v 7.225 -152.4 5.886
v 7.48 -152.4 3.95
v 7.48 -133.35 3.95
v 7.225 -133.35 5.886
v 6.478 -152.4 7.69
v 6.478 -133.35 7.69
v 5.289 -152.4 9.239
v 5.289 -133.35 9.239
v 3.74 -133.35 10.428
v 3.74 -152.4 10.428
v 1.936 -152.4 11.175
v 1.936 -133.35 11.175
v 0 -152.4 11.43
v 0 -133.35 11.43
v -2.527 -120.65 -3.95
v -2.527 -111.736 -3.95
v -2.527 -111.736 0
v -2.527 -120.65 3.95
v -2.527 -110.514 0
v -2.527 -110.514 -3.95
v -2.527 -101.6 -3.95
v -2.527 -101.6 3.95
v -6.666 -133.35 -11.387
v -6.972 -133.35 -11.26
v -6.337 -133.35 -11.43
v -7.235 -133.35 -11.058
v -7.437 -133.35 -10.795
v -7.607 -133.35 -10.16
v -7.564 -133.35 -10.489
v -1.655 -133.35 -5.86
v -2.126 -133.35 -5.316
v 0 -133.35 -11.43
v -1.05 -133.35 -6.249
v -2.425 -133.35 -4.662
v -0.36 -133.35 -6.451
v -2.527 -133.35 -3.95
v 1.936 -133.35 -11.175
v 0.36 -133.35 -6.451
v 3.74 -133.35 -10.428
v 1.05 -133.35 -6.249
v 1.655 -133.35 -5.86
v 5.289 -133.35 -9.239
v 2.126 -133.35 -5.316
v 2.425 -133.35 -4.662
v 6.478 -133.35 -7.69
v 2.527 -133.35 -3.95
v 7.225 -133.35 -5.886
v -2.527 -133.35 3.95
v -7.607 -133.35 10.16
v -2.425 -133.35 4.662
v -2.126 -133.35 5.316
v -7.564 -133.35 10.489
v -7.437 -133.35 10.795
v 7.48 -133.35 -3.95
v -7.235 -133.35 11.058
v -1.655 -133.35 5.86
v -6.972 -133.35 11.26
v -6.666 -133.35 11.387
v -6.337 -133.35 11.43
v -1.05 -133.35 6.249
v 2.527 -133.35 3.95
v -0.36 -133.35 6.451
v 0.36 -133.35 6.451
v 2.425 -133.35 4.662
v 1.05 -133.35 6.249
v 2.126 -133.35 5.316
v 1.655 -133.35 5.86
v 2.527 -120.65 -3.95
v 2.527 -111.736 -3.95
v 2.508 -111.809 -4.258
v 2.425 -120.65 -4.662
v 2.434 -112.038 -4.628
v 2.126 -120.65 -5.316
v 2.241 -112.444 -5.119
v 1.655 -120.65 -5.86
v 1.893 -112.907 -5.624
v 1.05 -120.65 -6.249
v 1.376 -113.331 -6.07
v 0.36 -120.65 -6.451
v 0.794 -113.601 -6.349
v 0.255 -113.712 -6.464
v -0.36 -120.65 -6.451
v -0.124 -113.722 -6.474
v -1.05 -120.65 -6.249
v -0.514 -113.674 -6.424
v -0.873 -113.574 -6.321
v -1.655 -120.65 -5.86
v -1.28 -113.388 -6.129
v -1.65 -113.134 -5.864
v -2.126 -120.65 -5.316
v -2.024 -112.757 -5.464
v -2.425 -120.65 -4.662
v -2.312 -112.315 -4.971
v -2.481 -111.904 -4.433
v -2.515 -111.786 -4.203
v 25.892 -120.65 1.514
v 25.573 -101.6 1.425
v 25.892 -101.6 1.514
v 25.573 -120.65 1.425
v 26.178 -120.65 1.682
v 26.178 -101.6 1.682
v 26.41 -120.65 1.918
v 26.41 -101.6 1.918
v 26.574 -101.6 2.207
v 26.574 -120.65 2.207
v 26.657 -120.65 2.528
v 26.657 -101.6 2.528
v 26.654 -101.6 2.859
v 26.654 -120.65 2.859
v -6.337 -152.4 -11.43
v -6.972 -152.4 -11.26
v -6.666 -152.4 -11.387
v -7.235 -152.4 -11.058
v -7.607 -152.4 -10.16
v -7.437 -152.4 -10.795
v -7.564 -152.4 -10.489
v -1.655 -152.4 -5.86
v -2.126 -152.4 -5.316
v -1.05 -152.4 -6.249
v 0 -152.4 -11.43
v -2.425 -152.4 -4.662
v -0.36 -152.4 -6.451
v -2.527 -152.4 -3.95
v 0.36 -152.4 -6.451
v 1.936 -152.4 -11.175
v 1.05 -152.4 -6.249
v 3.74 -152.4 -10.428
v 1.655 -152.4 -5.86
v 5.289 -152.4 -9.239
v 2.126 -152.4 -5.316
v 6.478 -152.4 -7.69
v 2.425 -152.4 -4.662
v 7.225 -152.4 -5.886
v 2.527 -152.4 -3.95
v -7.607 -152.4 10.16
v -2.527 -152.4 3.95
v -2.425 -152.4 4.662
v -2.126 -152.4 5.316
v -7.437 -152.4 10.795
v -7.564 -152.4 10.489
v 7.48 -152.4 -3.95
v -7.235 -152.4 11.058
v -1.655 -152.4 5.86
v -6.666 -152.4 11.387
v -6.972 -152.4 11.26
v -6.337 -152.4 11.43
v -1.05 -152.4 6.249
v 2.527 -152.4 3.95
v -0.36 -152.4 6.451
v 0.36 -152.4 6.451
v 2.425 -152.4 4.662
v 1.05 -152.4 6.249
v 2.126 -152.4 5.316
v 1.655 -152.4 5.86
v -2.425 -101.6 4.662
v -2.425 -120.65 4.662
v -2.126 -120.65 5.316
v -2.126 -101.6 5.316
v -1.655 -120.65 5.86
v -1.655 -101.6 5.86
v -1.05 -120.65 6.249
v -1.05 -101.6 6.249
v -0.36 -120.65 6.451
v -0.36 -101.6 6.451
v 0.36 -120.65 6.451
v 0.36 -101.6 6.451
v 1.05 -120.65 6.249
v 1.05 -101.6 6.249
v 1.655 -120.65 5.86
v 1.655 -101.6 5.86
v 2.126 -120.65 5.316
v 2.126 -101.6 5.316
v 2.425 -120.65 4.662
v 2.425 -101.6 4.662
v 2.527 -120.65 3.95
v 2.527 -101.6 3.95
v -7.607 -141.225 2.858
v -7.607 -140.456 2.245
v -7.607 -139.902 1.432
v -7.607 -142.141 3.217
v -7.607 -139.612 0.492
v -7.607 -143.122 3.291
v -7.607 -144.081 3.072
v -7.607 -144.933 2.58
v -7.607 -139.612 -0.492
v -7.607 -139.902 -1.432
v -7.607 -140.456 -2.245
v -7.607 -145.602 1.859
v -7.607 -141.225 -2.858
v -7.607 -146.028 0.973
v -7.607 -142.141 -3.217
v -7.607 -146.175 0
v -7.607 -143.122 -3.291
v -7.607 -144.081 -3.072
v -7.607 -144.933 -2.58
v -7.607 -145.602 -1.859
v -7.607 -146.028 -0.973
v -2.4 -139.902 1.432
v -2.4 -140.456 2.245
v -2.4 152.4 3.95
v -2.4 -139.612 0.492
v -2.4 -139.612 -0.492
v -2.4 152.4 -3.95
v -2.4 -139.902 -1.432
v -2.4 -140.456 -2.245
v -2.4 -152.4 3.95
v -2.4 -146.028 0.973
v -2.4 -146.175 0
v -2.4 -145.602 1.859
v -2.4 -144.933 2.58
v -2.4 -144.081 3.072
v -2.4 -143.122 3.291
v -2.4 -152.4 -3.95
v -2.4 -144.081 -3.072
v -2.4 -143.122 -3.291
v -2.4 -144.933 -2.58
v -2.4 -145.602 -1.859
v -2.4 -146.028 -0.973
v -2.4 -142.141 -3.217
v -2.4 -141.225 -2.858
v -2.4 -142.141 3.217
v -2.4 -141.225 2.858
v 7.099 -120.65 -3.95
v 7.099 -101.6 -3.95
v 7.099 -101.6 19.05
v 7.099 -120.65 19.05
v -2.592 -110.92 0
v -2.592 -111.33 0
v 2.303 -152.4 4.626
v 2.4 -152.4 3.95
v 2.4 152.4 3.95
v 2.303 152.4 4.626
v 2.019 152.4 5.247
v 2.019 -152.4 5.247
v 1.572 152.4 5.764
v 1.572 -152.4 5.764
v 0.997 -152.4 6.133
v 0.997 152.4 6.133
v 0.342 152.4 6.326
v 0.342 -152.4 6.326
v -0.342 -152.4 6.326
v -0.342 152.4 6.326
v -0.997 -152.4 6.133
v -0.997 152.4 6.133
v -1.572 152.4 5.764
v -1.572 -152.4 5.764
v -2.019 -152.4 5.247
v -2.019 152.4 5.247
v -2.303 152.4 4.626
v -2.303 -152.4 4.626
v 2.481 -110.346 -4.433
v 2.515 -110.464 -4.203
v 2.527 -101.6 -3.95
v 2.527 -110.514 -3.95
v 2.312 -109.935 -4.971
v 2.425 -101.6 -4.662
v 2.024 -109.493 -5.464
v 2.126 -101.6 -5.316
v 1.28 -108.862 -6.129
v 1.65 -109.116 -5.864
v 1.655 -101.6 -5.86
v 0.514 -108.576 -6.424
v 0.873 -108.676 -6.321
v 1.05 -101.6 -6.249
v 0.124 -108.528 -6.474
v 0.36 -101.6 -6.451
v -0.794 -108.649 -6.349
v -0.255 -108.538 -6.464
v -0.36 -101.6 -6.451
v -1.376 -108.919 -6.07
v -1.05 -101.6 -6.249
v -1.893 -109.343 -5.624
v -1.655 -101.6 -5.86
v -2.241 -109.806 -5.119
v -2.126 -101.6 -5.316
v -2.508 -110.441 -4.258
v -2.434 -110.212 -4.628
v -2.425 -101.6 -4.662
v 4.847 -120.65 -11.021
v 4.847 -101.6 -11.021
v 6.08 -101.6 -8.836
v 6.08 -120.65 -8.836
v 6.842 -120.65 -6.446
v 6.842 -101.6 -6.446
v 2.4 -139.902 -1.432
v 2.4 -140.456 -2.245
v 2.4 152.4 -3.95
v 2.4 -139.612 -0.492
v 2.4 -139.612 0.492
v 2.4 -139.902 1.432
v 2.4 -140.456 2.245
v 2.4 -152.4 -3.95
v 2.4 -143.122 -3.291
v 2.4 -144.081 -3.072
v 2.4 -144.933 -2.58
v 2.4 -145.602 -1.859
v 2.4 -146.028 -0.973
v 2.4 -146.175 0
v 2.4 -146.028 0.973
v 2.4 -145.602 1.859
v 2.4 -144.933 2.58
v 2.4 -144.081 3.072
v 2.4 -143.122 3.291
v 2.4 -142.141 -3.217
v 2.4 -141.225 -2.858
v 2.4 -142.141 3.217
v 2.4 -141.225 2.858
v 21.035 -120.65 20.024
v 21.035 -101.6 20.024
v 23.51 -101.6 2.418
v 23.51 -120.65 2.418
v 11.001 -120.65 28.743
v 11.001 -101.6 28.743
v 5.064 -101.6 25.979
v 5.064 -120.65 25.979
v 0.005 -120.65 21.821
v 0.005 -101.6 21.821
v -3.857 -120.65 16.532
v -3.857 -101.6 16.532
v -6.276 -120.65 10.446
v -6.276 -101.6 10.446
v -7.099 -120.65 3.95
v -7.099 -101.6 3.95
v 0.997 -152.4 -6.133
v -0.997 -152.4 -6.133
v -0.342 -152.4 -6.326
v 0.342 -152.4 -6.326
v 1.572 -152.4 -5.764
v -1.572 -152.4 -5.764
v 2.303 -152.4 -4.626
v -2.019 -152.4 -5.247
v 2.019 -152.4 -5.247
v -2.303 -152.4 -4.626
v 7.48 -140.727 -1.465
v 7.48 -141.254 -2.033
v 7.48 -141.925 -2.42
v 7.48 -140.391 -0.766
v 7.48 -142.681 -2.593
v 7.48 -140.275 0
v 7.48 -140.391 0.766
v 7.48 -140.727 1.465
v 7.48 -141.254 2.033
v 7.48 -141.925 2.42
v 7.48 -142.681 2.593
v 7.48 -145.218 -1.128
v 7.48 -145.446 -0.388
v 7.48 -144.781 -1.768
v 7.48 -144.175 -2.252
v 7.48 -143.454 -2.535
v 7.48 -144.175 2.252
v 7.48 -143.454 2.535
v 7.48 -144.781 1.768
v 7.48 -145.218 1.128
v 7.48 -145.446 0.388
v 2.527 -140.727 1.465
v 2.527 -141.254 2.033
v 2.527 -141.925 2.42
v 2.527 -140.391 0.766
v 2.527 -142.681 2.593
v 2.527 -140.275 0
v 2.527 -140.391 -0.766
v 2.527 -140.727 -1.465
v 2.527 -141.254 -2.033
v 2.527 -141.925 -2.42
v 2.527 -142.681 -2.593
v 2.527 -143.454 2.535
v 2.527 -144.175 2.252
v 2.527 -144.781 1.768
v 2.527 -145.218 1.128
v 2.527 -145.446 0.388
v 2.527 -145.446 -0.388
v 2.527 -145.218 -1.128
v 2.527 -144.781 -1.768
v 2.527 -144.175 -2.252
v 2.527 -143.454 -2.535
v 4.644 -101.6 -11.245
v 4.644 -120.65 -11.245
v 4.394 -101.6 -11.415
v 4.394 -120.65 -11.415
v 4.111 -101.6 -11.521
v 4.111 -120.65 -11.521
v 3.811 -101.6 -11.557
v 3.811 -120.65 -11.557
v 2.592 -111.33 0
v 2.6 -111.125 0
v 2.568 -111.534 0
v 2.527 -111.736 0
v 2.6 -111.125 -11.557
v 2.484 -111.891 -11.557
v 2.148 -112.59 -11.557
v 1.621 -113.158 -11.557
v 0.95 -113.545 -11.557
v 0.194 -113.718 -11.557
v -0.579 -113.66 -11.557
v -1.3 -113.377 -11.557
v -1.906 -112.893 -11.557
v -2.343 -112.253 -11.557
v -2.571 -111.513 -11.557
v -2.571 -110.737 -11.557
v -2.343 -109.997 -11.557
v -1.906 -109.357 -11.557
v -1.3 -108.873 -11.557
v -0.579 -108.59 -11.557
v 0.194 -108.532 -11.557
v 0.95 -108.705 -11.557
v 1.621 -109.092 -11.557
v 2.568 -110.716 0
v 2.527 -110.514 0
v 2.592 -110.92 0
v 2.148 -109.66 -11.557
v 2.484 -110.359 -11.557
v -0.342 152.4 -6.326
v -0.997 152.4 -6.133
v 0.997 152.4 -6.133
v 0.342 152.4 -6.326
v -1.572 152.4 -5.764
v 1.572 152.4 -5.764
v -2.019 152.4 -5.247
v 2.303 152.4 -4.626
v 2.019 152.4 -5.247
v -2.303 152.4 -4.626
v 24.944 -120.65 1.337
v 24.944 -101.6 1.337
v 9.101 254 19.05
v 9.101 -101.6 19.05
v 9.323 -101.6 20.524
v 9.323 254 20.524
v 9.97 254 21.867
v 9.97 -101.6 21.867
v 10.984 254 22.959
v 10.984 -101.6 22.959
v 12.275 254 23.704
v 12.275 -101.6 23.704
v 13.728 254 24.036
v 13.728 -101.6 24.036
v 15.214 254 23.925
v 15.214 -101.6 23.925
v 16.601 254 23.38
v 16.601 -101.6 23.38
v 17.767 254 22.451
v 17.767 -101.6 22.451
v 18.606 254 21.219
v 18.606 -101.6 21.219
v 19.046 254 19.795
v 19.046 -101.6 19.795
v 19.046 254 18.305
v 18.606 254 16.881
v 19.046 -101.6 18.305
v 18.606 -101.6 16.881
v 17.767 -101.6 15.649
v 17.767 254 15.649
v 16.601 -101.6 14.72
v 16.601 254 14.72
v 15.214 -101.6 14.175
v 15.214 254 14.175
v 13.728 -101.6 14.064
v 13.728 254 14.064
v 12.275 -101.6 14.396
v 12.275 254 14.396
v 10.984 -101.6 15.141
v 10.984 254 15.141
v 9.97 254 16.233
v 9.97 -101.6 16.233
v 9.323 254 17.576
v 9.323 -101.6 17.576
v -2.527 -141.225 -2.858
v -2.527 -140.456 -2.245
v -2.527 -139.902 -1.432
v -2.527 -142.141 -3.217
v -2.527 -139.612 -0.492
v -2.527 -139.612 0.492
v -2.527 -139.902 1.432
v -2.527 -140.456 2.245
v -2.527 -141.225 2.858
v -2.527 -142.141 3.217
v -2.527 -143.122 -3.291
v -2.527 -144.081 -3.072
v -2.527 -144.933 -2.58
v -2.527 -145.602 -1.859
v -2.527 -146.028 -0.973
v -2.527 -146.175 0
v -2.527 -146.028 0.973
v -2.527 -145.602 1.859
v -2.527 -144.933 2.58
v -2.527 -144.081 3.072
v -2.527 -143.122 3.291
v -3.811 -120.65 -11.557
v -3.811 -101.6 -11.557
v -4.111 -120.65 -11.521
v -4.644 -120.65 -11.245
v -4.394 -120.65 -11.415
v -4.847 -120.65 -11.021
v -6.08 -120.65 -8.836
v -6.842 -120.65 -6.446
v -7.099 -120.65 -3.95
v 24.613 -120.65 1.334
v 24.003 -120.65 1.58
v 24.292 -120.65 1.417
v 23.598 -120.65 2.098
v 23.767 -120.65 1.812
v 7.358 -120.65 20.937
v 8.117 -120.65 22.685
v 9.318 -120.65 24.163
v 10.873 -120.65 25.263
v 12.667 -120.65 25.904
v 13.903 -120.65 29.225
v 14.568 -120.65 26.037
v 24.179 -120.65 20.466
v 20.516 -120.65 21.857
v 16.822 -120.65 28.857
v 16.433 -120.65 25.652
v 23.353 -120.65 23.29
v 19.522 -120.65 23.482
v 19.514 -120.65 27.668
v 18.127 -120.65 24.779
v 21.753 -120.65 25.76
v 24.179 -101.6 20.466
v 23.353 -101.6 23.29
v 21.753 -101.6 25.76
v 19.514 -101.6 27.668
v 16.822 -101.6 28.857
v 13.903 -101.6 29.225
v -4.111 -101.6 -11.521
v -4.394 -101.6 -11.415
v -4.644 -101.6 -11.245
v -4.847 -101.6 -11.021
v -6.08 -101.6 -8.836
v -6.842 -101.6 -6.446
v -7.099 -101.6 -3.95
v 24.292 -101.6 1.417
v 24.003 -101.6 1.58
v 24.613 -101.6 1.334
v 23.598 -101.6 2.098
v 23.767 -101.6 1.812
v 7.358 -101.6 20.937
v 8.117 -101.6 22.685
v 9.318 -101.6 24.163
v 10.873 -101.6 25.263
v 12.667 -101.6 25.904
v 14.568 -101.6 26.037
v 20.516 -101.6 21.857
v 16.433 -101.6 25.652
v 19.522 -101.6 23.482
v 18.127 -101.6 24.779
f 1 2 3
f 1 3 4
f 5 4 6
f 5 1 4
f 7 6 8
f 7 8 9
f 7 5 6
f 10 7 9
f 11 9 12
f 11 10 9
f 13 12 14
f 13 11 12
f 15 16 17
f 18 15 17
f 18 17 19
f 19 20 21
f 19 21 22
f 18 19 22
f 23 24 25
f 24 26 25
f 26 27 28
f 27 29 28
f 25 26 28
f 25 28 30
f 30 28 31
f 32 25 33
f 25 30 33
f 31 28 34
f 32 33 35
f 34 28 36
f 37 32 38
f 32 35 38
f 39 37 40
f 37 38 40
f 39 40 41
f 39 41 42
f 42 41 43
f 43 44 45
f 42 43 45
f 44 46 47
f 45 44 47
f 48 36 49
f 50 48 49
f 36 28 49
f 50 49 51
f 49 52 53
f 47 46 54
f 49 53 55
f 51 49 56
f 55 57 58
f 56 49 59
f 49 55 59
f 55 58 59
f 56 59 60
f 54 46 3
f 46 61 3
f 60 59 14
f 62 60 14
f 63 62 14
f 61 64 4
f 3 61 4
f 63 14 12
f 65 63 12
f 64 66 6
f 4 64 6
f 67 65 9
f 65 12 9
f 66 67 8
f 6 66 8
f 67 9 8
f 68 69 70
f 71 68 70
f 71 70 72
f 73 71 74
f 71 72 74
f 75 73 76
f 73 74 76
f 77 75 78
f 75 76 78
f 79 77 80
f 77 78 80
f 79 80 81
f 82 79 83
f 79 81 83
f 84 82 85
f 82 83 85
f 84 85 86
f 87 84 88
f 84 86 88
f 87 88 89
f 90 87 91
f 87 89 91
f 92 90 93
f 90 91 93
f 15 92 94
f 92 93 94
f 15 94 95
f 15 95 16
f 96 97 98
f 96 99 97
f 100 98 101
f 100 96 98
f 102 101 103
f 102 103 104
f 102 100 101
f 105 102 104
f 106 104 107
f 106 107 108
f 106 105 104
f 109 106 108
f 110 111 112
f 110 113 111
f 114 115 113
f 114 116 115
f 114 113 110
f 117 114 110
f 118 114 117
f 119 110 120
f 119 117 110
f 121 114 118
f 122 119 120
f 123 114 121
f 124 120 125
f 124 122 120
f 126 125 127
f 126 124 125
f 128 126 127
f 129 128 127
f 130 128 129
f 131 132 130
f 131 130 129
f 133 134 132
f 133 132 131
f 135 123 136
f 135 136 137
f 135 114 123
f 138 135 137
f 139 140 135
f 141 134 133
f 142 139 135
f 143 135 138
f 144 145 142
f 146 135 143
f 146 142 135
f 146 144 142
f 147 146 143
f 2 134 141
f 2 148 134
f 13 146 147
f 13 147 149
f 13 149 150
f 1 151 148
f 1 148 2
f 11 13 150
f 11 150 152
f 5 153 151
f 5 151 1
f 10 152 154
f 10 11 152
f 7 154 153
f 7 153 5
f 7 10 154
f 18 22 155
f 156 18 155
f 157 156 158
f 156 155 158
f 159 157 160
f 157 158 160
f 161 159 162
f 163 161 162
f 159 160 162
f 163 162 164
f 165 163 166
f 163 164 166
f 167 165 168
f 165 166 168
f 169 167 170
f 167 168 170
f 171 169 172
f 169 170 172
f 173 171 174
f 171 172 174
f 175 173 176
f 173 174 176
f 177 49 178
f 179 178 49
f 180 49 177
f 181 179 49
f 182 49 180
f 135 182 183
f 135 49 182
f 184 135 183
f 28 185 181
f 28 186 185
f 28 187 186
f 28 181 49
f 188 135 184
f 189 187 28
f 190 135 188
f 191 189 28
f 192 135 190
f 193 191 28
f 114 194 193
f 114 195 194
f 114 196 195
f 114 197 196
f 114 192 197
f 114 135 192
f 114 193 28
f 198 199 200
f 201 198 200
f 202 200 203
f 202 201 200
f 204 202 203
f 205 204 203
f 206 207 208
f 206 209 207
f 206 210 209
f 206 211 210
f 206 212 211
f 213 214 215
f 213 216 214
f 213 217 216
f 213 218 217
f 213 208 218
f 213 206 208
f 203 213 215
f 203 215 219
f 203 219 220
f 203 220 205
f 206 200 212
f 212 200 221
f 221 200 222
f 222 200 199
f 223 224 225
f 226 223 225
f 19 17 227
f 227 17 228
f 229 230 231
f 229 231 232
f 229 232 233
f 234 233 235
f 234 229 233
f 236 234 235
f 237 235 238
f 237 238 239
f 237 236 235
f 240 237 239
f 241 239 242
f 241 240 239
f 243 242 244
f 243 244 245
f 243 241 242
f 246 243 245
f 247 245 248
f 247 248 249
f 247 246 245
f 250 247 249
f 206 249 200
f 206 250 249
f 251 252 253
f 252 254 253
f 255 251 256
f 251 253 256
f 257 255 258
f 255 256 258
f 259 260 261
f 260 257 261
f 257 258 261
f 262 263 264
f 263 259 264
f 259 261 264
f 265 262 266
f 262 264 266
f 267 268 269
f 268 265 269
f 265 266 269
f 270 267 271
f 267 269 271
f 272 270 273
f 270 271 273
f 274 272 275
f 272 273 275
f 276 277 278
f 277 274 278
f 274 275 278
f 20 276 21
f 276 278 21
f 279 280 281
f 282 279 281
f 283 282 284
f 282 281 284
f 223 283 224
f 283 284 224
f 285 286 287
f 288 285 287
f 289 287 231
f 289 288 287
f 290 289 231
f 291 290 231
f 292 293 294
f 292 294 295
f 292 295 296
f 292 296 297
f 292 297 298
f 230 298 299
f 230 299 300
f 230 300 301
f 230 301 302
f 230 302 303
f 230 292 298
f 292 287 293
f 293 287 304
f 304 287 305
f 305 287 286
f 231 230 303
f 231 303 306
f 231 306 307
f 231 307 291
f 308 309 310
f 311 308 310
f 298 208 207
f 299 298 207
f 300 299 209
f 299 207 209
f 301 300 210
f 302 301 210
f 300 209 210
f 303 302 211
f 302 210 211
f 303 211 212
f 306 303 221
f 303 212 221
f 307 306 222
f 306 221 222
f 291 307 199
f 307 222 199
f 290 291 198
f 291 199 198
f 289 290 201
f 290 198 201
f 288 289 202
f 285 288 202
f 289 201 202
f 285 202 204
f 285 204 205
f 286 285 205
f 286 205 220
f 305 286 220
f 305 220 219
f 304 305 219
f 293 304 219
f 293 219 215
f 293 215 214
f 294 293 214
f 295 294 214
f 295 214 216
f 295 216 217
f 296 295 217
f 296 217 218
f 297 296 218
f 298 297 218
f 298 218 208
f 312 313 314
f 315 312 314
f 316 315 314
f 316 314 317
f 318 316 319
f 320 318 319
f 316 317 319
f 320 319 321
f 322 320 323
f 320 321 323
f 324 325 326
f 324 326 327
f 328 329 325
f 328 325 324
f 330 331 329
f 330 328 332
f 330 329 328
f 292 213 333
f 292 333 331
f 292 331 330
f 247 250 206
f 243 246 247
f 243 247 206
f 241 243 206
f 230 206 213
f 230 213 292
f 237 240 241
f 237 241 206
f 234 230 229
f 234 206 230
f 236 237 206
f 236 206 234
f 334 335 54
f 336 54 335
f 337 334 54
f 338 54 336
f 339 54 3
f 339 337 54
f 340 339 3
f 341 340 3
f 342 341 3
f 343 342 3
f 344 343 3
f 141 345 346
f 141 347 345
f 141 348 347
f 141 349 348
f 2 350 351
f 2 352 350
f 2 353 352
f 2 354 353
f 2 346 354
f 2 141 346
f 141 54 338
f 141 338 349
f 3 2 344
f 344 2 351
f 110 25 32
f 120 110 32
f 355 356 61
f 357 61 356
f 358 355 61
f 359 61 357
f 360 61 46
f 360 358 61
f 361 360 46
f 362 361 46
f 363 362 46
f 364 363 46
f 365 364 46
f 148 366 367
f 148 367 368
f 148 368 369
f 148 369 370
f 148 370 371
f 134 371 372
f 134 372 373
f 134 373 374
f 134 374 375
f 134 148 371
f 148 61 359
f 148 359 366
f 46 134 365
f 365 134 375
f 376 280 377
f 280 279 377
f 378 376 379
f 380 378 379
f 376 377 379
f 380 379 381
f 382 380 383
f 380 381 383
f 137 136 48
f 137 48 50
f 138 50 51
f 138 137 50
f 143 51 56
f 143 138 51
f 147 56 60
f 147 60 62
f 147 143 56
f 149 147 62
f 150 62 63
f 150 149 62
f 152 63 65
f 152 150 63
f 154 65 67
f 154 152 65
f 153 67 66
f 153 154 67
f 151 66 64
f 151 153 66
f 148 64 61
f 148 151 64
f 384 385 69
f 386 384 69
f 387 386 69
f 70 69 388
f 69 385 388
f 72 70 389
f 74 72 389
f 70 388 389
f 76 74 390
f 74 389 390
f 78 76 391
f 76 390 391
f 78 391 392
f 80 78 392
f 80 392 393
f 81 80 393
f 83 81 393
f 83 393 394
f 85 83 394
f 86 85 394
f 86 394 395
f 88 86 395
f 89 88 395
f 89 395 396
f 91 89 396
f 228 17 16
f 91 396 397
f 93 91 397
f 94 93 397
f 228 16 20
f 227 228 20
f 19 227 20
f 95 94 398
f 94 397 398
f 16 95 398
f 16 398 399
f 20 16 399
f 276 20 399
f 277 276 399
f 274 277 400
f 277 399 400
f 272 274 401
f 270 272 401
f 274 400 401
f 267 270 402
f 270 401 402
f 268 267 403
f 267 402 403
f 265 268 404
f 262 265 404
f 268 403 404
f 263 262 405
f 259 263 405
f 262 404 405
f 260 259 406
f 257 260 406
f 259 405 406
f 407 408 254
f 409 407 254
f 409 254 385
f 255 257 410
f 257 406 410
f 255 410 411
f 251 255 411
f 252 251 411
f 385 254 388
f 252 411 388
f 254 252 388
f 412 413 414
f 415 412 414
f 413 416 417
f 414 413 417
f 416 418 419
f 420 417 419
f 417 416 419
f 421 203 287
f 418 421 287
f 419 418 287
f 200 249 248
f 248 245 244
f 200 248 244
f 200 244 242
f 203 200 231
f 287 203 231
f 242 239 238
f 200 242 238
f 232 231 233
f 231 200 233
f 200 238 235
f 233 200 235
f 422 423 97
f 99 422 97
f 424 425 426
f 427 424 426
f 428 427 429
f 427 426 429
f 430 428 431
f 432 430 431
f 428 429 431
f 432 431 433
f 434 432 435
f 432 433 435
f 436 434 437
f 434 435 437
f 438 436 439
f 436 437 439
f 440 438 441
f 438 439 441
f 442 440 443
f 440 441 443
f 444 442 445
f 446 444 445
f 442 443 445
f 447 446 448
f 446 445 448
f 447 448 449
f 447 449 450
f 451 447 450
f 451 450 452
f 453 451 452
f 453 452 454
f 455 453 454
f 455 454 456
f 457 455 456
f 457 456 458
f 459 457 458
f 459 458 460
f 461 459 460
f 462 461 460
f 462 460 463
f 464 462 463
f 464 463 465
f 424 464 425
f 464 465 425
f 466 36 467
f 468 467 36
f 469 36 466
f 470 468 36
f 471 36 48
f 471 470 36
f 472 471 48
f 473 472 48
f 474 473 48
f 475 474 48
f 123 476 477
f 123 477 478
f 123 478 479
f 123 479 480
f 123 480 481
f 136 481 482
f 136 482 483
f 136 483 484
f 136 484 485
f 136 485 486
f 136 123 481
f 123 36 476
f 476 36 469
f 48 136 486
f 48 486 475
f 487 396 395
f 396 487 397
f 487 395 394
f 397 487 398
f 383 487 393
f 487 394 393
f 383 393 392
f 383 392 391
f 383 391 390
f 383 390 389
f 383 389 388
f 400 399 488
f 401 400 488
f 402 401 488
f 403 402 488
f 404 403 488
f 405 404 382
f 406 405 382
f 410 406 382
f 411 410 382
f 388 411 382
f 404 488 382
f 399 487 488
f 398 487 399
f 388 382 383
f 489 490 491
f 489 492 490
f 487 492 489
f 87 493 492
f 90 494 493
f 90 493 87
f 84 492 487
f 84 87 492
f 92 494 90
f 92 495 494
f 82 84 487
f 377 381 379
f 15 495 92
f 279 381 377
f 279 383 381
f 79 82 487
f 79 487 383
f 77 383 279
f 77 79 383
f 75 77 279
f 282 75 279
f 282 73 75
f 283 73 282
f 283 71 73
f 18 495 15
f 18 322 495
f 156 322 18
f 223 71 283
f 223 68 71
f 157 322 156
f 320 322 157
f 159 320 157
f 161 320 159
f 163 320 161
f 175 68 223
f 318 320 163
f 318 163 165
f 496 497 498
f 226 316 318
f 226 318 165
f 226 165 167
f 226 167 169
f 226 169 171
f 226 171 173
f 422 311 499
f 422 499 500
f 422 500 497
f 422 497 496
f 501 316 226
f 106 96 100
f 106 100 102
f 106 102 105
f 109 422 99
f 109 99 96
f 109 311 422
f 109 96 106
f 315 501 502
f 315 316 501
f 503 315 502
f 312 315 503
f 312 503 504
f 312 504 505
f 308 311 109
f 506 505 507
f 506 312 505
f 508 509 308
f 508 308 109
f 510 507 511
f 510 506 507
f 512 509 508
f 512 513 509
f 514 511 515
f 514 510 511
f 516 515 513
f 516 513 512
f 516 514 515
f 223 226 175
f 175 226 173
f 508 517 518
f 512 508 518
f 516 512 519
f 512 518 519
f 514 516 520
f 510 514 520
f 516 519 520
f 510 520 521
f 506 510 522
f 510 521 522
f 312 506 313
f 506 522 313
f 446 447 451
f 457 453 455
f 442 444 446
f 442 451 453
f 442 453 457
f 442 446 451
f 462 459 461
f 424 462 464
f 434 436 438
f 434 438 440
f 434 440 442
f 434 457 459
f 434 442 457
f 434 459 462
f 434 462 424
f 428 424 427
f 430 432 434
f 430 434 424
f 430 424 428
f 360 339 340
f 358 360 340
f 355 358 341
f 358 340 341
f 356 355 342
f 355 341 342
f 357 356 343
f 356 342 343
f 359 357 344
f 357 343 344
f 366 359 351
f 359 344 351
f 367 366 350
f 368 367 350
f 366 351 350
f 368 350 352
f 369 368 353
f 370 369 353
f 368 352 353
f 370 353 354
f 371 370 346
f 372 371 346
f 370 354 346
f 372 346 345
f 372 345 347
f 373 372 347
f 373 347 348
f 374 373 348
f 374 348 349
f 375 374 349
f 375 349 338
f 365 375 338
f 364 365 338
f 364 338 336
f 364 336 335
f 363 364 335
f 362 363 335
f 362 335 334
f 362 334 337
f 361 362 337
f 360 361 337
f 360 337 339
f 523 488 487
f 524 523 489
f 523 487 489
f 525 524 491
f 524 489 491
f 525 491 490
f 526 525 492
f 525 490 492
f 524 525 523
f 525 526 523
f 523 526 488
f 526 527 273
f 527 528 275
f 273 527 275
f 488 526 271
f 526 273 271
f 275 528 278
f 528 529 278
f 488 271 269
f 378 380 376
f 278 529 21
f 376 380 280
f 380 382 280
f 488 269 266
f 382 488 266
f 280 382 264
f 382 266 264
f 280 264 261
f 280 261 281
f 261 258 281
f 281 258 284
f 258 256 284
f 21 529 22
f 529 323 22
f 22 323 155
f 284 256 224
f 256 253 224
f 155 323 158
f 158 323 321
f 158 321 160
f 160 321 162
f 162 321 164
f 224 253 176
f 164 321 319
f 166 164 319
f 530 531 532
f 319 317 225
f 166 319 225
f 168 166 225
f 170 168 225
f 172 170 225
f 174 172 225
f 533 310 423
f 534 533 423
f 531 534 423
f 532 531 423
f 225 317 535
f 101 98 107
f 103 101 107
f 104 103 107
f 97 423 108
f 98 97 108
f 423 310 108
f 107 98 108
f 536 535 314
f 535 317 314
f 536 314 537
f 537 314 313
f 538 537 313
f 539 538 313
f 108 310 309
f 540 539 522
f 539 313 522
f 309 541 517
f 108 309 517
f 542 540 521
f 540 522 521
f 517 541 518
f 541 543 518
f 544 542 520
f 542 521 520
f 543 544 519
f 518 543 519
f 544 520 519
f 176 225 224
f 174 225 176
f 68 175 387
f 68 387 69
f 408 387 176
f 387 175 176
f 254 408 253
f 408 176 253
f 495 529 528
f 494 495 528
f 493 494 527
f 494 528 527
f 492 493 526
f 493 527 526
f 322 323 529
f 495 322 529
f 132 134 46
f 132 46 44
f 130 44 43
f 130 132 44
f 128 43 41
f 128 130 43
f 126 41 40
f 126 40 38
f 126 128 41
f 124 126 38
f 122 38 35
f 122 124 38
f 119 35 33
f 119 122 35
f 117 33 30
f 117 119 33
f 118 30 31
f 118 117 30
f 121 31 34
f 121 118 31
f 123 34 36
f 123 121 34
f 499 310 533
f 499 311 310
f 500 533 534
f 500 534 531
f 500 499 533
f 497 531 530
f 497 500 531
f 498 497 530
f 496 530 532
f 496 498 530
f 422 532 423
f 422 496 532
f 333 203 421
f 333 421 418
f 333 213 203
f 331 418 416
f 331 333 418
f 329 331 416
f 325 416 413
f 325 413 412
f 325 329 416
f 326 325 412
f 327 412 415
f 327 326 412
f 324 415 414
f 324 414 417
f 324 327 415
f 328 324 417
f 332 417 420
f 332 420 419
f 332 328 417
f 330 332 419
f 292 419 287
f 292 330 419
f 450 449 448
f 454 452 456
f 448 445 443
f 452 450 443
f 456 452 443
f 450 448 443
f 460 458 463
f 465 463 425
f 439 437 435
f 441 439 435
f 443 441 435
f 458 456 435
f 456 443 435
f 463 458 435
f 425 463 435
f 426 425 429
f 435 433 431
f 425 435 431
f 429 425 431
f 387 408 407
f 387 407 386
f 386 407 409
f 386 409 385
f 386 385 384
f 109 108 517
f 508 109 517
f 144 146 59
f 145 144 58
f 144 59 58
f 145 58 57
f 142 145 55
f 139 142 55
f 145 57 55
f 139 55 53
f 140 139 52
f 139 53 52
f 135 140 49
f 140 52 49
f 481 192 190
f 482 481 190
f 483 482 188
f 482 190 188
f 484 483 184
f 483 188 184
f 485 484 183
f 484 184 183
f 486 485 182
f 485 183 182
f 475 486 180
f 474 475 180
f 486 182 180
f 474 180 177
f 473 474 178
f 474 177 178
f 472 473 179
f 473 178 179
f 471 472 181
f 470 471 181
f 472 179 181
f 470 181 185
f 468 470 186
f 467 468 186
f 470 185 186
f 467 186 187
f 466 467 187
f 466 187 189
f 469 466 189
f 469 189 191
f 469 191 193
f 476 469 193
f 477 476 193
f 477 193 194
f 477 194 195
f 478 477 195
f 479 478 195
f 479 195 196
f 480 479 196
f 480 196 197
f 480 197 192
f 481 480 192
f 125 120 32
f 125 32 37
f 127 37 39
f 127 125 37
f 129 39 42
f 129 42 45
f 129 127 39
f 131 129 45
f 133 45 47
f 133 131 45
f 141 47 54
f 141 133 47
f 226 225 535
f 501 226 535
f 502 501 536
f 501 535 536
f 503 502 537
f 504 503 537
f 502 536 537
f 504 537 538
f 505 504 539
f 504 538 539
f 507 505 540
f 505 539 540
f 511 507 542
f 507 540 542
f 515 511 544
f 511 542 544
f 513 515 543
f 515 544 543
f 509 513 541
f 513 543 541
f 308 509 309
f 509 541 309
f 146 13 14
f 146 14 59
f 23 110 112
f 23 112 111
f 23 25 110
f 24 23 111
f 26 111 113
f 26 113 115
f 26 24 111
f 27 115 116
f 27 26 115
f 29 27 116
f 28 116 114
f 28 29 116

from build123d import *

# Parameters (mm, degrees)
F1_DEPTH  = 152.4
F3_DEPTH  = 19.05
F4_R      = 2.6
F5_DEPTH  = 15.0886
F6_R      = 3.3
F7_DEPTH  = 10.0076
F10_DEPTH = 19.05
F11_R     = 1.27
F11_2_R   = 1.27
F12_R     = 2.6
F13_DEPTH = 11.557
F14_R     = 5
F15_DEPTH = 355.6


with BuildPart() as f1:
    # F0 (on Front) → F1 (new body, symmetric)
    with BuildSketch(Plane.XZ):
        with BuildLine():
            ThreePointArc((-2.4003, -3.9497), (0, -6.35), (2.4003, -3.9497))
            Line((2.4003, -3.9497), (2.4003, 3.9497))
            ThreePointArc((2.4003, 3.9497), (0, 6.35), (-2.4003, 3.9497))
            Line((-2.4003, 3.9497), (-2.4003, -3.9497))
        make_face()
    extrude(amount=F1_DEPTH, both=True)


with BuildPart() as f3:
    # F2 (on face) → F3 (new body)
    with BuildSketch(Plane.XZ.offset(152.4)):
        with BuildLine():
            Line((7.4803, -3.9497), (7.4803, 3.9497))
            ThreePointArc((7.4803, 3.9497), (5.2893708553, 9.2390708553), (0, 11.43))
            Line((0, 11.43), (-7.6073, 11.43))
            Line((-7.6073, 11.43), (-7.6073, -11.43))
            Line((-7.6073, -11.43), (0, -11.43))
            ThreePointArc((0, -11.43), (5.2893708553, -9.2390708553), (7.4803, -3.9497))
        make_face()
        with BuildLine():
            ThreePointArc((-2.5273, 3.9497), (0, 6.477), (2.5273, 3.9497))
            Line((2.5273, 3.9497), (2.5273, -3.9497))
            ThreePointArc((2.5273, -3.9497), (0, -6.477), (-2.5273, -3.9497))
            Line((-2.5273, -3.9497), (-2.5273, 3.9497))
        make_face(mode=Mode.SUBTRACT)
    extrude(amount=-F3_DEPTH)


with BuildPart() as f5_tool:
    # F4 (on face) → F5 (new body, through all)
    with BuildSketch(Plane.YZ.offset(7.4803)):
        with Locations((-142.875, 0)):
            Circle(F4_R)
    extrude(amount=-F5_DEPTH)


with BuildPart() as f1_1:
    add(f1.part)

    # F5: cut by f5_tool
    add(f5_tool.part, mode=Mode.SUBTRACT)


with BuildPart() as f3_1:
    add(f3.part)

    # F5: cut by f5_tool
    add(f5_tool.part, mode=Mode.SUBTRACT)


with BuildPart() as f7_tool:
    # F6 (on face) → F7 (new body, through all)
    with BuildSketch(Plane(origin=(-7.6073, 0, 0), x_dir=(0, -1, 0), z_dir=(-1, 0, 0))):
        with Locations((142.875, 0)):
            Circle(F6_R)
    extrude(amount=-F7_DEPTH)


with BuildPart() as f1_2:
    add(f1_1.part)

    # F7: cut by f7_tool
    add(f7_tool.part, mode=Mode.SUBTRACT)


with BuildPart() as f3_2:
    add(f3_1.part)

    # F7: cut by f7_tool
    add(f7_tool.part, mode=Mode.SUBTRACT)

    # F11#2
    f11_2_edges = [f3_2.edges().sort_by_distance(p)[0] for p in [
        (-7.6073, -142.875, -11.43),
        (-7.6073, -142.875, 11.43),
    ]]
    fillet(f11_2_edges, radius=F11_2_R)


with BuildPart() as f10:
    # F9 (on offset) → F10 (new body)
    with BuildSketch(Plane.XZ.offset(101.6)):
        with BuildLine():
            ThreePointArc((4.445, -11.557), (6.4166719567, -7.9782332871), (7.0993, -3.9497))
            Line((7.0993, -3.9497), (7.0993, 3.9497))
            Line((7.0993, 3.9497), (7.0993, 19.05))
            ThreePointArc((7.0993, 19.05), (13.6129178767, 26.035), (21.0352697821, 20.0244979382))
            Line((21.0352697821, 20.0244979382), (23.6865173554, 1.1598912287))
            Line((23.6865173554, 1.1598912287), (26.8306184737, 1.6017658242))
            Line((26.8306184737, 1.6017658242), (24.1793709004, 20.4663725338))
            ThreePointArc((24.1793709004, 20.4663725338), (19.514001666, 27.6683383689), (11.0005581512, 28.7431692878))
            ThreePointArc((11.0005581512, 28.7431692878), (-2.0929146534, 19.2983235899), (-7.0993, 3.9497))
            Line((-7.0993, 3.9497), (-7.0993, -3.9497))
            ThreePointArc((-7.0993, -3.9497), (-6.4166719567, -7.9782332871), (-4.445, -11.557))
            Line((-4.445, -11.557), (4.445, -11.557))
        make_face()
        with BuildLine():
            ThreePointArc((-2.5273, 3.9497), (0, 6.477), (2.5273, 3.9497))
            Line((2.5273, 3.9497), (2.5273, -3.9497))
            ThreePointArc((2.5273, -3.9497), (0, -6.477), (-2.5273, -3.9497))
            Line((-2.5273, -3.9497), (-2.5273, 3.9497))
        make_face(mode=Mode.SUBTRACT)
    extrude(amount=F10_DEPTH)

    # F11
    f11_edges = [f10.edges().sort_by_distance(p)[0] for p in [
        (26.830618, -111.125, 1.601766),
        (23.686517, -111.125, 1.159891),
        (-4.445, -111.125, -11.557),
        (4.445, -111.125, -11.557),
    ]]
    fillet(f11_edges, radius=F11_R)

    # F12 (on face) → F13 (cut, through all)
    with BuildSketch(Plane(origin=(0, 0, -11.557), x_dir=(1, 0, 0), z_dir=(0, 0, -1))):
        with Locations((0, 111.125)):
            Circle(F12_R)
    extrude(amount=-F13_DEPTH, mode=Mode.SUBTRACT)


with BuildPart() as f15:
    # F14 (on face) → F15 (new body)
    with BuildSketch(Plane(origin=(0, -101.6, 0), x_dir=(-1, 0, 0), z_dir=(0, 1, 0))):
        with Locations((-14.1013566581, 19.05)):
            Circle(F14_R)
    extrude(amount=F15_DEPTH)


solid = Compound([f1_2.part, f3_2.part, f10.part, f15.part])
